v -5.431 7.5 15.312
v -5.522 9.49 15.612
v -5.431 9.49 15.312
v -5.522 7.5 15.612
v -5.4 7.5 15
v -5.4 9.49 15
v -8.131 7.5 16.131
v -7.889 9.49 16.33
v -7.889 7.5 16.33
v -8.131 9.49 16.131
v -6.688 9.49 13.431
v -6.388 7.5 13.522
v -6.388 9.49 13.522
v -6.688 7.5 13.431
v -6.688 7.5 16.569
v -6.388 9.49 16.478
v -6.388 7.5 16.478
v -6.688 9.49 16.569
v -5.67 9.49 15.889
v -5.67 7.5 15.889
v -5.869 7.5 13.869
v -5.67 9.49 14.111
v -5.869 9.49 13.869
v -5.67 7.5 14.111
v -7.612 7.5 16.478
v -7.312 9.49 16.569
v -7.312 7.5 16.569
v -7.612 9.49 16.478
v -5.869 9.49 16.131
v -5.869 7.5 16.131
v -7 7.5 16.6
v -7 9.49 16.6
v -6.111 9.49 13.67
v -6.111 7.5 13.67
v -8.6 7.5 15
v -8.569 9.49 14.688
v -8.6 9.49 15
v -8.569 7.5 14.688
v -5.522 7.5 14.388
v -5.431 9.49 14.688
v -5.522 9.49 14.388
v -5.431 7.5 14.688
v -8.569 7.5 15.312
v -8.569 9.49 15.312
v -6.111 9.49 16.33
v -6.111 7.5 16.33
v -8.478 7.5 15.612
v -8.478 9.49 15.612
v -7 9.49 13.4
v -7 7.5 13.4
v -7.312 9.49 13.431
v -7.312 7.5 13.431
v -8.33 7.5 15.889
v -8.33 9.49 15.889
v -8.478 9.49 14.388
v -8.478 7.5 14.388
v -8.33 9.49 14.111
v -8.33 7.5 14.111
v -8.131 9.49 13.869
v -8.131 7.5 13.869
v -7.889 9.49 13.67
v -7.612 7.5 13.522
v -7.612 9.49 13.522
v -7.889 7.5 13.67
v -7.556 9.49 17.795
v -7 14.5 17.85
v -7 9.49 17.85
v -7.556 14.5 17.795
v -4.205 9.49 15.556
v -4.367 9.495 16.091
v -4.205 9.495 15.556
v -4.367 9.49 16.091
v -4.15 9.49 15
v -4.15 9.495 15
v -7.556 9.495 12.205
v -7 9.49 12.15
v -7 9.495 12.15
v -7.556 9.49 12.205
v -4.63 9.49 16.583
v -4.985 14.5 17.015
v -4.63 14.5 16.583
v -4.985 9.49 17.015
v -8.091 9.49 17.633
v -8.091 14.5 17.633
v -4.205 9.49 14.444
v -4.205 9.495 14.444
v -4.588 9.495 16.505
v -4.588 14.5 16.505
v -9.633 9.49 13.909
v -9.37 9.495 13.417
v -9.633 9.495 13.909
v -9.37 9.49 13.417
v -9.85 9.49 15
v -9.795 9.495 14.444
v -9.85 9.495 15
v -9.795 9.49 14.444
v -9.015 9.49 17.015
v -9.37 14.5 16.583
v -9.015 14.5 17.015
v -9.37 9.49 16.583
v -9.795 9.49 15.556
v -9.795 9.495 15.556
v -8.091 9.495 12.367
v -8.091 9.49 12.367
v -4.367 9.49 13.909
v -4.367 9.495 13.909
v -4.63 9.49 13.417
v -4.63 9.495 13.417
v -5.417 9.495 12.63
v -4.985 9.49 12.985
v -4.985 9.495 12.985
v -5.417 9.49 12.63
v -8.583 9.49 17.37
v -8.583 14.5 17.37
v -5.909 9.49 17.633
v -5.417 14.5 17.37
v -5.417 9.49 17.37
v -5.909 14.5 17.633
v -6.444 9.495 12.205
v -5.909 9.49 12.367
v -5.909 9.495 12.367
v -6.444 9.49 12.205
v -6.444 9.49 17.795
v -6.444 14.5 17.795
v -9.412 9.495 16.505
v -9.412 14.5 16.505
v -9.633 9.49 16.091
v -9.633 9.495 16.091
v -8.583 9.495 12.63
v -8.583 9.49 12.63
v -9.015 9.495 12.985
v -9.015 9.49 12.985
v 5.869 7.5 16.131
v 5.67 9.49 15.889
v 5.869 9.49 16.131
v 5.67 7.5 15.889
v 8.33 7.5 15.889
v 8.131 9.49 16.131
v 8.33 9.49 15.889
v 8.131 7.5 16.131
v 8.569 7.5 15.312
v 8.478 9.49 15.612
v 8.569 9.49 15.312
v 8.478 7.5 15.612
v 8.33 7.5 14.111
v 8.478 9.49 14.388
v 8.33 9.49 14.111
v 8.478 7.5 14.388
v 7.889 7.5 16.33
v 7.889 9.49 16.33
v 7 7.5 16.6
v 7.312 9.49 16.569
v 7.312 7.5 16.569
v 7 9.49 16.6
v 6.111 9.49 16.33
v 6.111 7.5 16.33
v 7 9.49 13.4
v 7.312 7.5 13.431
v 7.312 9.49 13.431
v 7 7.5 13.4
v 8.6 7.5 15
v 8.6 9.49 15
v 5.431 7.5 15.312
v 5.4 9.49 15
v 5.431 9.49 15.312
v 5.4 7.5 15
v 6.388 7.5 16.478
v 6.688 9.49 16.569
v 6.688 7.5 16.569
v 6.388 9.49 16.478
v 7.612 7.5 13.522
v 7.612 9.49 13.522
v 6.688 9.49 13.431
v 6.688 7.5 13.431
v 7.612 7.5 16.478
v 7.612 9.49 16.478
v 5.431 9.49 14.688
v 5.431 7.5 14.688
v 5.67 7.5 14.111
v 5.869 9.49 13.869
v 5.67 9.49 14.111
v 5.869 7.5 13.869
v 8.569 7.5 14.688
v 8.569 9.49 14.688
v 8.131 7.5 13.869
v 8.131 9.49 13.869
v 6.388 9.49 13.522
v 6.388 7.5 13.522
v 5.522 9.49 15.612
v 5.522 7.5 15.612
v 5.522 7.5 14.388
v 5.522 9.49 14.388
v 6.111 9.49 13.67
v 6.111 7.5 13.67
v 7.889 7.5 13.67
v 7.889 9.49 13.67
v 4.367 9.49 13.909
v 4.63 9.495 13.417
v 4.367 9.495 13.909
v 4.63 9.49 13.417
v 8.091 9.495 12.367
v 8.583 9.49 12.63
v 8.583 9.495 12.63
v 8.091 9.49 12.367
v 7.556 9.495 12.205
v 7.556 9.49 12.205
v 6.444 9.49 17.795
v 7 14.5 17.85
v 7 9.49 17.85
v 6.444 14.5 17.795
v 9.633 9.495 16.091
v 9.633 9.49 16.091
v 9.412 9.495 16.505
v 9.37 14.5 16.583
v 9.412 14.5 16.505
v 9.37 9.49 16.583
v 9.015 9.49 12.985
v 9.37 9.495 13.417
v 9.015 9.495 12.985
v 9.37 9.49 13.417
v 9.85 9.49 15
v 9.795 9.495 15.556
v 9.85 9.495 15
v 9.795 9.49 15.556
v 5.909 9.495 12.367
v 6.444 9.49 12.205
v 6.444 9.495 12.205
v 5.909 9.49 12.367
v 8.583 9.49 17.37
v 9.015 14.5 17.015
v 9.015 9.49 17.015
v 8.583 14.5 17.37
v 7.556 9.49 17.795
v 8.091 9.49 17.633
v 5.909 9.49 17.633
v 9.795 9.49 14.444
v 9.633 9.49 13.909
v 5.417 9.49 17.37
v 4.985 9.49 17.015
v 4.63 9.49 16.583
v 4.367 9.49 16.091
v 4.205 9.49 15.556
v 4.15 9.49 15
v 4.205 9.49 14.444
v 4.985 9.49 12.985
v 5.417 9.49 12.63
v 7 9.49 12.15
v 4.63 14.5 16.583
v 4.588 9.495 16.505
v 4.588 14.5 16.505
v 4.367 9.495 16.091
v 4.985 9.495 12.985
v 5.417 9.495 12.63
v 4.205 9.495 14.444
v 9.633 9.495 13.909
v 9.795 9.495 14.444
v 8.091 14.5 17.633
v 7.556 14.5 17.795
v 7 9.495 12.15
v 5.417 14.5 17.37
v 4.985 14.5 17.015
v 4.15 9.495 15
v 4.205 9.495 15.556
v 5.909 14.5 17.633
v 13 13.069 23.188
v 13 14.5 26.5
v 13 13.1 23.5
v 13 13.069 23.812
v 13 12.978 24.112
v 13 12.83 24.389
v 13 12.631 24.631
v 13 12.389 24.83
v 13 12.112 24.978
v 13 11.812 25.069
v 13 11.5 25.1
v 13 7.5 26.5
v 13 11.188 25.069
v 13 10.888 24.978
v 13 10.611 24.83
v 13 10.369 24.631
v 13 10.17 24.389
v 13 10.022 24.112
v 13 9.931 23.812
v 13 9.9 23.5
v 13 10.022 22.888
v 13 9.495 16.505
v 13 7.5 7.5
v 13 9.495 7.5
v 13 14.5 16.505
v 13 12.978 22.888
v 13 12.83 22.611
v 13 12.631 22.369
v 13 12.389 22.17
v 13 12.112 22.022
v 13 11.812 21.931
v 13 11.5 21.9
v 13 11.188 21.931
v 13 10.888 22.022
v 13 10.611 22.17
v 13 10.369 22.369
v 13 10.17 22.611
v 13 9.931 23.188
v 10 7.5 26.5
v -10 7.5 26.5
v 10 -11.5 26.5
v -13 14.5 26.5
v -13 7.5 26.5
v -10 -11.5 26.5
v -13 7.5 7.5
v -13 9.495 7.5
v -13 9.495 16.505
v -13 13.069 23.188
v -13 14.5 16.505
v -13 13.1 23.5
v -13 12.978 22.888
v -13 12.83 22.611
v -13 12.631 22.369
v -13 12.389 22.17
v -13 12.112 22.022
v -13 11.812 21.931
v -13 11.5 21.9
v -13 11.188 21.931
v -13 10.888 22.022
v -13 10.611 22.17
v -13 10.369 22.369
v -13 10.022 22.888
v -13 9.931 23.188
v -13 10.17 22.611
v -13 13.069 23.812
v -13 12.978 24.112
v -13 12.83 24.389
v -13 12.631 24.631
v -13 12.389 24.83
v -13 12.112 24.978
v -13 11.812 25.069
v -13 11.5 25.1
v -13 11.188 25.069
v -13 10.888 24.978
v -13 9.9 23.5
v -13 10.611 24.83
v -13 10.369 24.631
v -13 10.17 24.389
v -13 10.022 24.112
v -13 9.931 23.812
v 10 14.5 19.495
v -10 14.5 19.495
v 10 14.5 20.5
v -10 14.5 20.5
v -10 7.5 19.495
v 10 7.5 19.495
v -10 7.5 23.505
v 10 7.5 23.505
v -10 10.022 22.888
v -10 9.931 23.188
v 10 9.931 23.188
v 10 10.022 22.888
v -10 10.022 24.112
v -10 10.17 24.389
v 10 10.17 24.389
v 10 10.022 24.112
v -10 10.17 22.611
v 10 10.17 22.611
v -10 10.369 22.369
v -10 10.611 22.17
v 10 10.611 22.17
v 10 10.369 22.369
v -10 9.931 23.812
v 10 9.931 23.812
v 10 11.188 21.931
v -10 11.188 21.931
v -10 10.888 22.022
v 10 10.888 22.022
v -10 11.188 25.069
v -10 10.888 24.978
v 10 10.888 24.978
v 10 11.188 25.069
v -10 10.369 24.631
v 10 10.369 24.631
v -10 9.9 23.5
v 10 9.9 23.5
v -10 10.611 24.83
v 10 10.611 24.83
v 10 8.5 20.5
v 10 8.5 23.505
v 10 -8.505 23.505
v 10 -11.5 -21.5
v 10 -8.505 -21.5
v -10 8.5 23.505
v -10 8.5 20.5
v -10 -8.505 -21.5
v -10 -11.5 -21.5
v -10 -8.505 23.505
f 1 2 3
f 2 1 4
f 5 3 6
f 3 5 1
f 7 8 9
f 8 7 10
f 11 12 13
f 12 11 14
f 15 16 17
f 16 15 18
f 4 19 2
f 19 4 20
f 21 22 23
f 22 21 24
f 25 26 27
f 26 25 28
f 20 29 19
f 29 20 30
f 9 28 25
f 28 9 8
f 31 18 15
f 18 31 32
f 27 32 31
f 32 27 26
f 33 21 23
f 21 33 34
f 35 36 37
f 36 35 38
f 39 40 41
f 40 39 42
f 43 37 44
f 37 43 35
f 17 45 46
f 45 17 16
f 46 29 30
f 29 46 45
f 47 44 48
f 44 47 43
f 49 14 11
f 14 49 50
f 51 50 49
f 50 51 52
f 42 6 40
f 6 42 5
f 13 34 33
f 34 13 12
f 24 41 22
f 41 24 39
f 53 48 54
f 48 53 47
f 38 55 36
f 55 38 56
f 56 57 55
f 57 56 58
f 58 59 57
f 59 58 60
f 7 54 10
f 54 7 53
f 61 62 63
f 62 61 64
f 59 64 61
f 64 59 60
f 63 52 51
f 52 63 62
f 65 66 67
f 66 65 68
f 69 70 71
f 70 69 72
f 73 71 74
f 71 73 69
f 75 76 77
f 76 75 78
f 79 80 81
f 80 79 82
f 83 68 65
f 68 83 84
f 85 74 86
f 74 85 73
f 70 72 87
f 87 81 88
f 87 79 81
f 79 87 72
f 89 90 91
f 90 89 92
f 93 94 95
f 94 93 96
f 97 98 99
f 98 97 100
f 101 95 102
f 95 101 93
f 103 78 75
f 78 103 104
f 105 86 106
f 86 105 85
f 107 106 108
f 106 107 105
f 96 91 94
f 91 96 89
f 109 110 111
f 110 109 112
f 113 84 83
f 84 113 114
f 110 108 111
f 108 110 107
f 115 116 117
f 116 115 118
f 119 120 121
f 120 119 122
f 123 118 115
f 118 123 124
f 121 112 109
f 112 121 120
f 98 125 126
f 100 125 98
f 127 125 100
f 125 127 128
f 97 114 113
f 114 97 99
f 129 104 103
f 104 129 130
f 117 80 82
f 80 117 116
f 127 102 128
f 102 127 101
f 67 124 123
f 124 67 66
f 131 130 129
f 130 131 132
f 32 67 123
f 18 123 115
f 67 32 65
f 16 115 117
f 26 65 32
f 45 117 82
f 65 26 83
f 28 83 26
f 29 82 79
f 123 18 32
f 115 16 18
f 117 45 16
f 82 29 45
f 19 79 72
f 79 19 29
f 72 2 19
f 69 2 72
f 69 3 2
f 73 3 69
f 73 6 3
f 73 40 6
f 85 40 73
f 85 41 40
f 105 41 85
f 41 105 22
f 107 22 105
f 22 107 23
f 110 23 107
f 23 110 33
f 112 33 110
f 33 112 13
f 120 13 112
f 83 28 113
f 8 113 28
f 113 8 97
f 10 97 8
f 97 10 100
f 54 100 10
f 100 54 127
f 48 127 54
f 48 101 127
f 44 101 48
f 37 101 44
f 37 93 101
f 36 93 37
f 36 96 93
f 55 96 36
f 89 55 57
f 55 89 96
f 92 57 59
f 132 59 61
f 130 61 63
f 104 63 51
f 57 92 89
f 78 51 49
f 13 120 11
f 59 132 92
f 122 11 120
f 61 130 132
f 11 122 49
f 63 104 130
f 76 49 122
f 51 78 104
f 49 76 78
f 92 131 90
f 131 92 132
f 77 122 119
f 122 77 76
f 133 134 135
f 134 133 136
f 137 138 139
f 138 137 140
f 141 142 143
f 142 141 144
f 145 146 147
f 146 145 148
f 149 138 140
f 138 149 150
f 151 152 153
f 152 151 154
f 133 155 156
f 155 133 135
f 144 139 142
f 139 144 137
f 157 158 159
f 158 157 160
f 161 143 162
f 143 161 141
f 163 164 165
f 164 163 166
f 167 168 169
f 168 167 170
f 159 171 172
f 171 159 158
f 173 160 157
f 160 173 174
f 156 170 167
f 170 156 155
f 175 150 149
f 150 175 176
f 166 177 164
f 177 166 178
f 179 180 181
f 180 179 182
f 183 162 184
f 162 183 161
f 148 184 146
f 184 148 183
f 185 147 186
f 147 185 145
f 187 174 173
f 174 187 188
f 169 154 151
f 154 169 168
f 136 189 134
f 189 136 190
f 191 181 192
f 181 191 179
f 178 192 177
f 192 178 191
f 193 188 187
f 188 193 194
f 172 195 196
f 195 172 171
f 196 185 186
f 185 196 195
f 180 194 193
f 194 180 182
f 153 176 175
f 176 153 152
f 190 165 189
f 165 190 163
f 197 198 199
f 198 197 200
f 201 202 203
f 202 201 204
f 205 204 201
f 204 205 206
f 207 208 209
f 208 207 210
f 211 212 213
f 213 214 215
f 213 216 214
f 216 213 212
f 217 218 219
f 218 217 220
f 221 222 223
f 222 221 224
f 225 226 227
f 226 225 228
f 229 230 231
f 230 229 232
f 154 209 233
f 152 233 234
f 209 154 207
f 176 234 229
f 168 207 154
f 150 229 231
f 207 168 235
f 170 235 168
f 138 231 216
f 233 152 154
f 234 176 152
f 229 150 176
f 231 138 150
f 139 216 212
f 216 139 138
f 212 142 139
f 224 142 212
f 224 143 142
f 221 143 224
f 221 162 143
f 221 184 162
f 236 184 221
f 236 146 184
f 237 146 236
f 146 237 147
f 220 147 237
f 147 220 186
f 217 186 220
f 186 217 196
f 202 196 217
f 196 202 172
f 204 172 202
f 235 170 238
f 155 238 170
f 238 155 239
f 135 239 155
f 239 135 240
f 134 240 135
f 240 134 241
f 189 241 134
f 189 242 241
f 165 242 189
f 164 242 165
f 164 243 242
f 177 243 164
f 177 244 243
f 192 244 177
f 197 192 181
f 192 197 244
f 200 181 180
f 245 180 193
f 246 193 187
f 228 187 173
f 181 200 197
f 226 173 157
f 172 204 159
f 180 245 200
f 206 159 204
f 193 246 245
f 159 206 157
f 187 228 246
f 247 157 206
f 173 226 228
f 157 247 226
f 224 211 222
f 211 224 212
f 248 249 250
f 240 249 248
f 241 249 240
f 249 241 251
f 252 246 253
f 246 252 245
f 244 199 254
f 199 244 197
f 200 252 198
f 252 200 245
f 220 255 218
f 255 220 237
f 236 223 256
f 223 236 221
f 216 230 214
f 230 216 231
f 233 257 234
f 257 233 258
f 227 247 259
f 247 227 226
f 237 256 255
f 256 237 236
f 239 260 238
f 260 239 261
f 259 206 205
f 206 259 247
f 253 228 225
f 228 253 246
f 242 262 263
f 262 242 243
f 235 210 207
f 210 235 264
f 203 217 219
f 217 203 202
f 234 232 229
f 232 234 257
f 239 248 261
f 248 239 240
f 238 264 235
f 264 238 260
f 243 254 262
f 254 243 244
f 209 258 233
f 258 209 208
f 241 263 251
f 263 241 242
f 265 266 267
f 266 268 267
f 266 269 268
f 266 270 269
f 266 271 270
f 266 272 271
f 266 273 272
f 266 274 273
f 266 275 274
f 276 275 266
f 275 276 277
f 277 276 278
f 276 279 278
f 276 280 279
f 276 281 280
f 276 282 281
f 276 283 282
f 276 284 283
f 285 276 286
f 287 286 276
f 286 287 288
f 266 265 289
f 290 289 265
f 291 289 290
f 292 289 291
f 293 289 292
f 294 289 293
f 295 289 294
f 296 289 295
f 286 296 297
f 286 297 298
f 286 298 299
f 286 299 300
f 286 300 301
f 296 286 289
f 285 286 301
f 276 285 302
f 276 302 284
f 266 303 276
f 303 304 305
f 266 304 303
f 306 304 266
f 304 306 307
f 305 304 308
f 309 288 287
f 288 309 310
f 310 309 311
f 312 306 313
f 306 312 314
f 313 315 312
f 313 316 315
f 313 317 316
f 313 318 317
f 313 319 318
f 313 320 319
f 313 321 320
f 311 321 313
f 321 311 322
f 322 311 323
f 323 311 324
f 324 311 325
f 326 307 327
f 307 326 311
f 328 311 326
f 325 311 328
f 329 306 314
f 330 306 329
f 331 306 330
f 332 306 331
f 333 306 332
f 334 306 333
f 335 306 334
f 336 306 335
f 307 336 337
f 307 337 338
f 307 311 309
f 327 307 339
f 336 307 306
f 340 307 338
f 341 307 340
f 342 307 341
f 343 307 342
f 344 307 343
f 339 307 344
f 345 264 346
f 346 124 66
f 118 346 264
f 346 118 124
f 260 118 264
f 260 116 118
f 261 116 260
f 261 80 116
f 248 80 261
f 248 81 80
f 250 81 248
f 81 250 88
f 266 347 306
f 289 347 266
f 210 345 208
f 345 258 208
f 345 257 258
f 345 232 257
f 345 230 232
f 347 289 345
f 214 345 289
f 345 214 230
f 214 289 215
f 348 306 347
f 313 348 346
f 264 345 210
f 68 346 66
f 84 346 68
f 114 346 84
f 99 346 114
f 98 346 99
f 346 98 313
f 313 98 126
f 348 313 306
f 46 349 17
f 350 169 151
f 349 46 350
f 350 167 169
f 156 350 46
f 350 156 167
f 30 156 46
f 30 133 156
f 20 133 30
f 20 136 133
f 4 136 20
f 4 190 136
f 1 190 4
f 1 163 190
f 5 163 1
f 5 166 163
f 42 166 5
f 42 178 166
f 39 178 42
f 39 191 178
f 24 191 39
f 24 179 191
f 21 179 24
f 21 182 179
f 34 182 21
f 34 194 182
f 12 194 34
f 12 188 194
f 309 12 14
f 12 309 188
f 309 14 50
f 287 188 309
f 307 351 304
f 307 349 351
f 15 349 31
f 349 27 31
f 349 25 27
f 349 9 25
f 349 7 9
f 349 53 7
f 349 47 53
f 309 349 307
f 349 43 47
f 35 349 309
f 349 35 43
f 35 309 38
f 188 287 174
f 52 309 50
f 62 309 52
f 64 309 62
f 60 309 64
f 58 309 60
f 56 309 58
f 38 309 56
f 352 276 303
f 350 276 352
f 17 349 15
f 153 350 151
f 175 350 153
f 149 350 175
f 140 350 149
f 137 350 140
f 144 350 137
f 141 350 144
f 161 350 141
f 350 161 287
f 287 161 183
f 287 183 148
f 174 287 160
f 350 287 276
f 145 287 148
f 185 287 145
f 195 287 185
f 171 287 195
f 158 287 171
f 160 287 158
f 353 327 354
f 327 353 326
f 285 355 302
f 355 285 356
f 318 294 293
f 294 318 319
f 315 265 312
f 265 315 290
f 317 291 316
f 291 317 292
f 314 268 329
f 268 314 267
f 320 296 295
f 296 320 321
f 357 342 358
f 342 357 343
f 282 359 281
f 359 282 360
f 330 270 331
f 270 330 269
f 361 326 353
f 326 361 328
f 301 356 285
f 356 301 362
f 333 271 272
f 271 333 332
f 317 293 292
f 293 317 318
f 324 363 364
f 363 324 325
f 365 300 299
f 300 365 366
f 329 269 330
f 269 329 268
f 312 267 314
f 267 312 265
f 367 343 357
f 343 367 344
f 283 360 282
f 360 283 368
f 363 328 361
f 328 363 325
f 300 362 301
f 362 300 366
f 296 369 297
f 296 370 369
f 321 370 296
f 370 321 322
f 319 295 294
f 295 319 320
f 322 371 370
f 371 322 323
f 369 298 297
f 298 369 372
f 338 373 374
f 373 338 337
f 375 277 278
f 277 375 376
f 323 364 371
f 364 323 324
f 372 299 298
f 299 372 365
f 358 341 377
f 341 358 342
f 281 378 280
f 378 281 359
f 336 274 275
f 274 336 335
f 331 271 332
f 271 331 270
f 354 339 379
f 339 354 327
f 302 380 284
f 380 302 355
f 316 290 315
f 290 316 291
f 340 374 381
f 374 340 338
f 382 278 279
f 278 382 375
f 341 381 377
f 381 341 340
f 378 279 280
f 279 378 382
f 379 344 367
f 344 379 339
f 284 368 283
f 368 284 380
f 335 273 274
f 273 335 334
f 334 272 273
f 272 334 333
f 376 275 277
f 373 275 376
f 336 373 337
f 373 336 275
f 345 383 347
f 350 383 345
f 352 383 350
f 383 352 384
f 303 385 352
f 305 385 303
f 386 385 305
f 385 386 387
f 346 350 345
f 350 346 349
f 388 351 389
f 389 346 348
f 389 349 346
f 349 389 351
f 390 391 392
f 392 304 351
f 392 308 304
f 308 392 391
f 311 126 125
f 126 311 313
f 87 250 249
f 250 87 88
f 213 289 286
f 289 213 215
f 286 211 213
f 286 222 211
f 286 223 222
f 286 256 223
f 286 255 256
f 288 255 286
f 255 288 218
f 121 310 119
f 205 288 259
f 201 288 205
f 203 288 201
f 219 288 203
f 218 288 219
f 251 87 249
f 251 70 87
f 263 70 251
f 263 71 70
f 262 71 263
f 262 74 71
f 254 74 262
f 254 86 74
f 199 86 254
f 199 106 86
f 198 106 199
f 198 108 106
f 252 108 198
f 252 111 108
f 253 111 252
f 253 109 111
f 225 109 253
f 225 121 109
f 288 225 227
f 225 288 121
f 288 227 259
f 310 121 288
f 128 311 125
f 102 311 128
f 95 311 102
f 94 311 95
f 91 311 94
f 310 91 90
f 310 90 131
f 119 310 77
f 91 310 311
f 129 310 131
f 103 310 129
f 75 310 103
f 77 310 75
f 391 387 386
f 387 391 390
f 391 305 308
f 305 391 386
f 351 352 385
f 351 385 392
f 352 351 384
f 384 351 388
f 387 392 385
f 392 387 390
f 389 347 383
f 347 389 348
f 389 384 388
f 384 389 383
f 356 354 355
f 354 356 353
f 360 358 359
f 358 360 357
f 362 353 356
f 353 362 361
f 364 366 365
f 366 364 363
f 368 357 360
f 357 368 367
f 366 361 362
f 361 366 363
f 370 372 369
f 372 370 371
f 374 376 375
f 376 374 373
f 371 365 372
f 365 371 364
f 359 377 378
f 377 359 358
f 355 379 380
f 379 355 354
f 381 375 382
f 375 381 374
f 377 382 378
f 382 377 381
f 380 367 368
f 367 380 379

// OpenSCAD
$fn = 32;

width = 20;
openbeam_width = 15;
screw_dia = 3;
screw_head_dia = 5.5;
screw_delta = 0.1;
thickness = 3;
play = 1;

cutter_delta = 0.01;

module openbeams() {
	translate([0, 0, -openbeam_width])
		#cube([100, openbeam_width, openbeam_width], center=true);
	translate([0, 0, openbeam_width])
		#cube([100, openbeam_width, openbeam_width], center=true);
}

%openbeams();

module hinge() {
	difference() {
		// blank
		cube([width + 2*thickness, 2*screw_dia + play, openbeam_width + thickness + play], center = true);

		// drill holes
		for (a = [-1:2:1])
			translate([a*(width/2 - screw_dia), 0, -thickness/2 - play/2]) {
				rotate([90, 0, 0])
					cylinder(d = screw_dia + 2*screw_delta,
						h = 2*(screw_dia + thickness + cutter_delta), center = true);
				translate([0, thickness/2, 0])
					rotate([90, 0, 0])
						cylinder(d = screw_head_dia + 2*screw_delta,
							h = 2*(screw_dia + cutter_delta), center = true);
			}
		translate([0, play/2, openbeam_width/2 + thickness/2 + play/2 - screw_dia])
			rotate([0, 90, 0])
				cylinder(d = screw_dia + 2*screw_delta,
					h = width + 2*thickness + cutter_delta, center = true);

		// cut down to size
		translate([0, 0, openbeam_width/2 + thickness - screw_dia - thickness/2])
			cube([width,
				2*screw_dia + cutter_delta + play,
				2*screw_dia + cutter_delta + play], center = true);
		translate([0, thickness/2, -1.5*thickness - play/2])
			cube([width + 2*thickness + cutter_delta,
				2*screw_dia + cutter_delta,
				openbeam_width - 2*screw_dia + cutter_delta], center = true);
	}
}

translate([0, openbeam_width/2 + play/2 + screw_dia, openbeam_width + thickness/2 + play/2])
	hinge();

//rotate([90, 0, 0]) hinge();

module bracket() {
	difference() {
		union() {
			difference() {
				cube([width,
					openbeam_width + thickness + 2*play + 2*screw_dia,
					3*openbeam_width + thickness + play - 1], center = true);
				translate([0, thickness/2, -thickness/2])
					cube([width + cutter_delta,
						openbeam_width + 2*play + 2*screw_dia + cutter_delta,
						3*openbeam_width + play - 1 + cutter_delta], center = true);
			}
			translate([0, openbeam_width/2 + thickness/2 + play,
					1.5*openbeam_width + play/2 + thickness/2 - screw_dia - 0.5])
				cube([width, 2*screw_dia, 2*screw_dia], center = true);
		}

		translate([0, openbeam_width/2 + thickness/2 + play,
				1.5*openbeam_width + play/2 + thickness/2 - screw_dia - 0.5])
			rotate([0, 90, 0])
				cylinder(d = screw_dia + 2*screw_delta, h = width + 2*thickness + cutter_delta, center = true);
	}
}

translate([0, -thickness/2 + screw_dia, play/2 + thickness/2 + 0.5])
	bracket();

//rotate([90, 90, 0]) bracket();
